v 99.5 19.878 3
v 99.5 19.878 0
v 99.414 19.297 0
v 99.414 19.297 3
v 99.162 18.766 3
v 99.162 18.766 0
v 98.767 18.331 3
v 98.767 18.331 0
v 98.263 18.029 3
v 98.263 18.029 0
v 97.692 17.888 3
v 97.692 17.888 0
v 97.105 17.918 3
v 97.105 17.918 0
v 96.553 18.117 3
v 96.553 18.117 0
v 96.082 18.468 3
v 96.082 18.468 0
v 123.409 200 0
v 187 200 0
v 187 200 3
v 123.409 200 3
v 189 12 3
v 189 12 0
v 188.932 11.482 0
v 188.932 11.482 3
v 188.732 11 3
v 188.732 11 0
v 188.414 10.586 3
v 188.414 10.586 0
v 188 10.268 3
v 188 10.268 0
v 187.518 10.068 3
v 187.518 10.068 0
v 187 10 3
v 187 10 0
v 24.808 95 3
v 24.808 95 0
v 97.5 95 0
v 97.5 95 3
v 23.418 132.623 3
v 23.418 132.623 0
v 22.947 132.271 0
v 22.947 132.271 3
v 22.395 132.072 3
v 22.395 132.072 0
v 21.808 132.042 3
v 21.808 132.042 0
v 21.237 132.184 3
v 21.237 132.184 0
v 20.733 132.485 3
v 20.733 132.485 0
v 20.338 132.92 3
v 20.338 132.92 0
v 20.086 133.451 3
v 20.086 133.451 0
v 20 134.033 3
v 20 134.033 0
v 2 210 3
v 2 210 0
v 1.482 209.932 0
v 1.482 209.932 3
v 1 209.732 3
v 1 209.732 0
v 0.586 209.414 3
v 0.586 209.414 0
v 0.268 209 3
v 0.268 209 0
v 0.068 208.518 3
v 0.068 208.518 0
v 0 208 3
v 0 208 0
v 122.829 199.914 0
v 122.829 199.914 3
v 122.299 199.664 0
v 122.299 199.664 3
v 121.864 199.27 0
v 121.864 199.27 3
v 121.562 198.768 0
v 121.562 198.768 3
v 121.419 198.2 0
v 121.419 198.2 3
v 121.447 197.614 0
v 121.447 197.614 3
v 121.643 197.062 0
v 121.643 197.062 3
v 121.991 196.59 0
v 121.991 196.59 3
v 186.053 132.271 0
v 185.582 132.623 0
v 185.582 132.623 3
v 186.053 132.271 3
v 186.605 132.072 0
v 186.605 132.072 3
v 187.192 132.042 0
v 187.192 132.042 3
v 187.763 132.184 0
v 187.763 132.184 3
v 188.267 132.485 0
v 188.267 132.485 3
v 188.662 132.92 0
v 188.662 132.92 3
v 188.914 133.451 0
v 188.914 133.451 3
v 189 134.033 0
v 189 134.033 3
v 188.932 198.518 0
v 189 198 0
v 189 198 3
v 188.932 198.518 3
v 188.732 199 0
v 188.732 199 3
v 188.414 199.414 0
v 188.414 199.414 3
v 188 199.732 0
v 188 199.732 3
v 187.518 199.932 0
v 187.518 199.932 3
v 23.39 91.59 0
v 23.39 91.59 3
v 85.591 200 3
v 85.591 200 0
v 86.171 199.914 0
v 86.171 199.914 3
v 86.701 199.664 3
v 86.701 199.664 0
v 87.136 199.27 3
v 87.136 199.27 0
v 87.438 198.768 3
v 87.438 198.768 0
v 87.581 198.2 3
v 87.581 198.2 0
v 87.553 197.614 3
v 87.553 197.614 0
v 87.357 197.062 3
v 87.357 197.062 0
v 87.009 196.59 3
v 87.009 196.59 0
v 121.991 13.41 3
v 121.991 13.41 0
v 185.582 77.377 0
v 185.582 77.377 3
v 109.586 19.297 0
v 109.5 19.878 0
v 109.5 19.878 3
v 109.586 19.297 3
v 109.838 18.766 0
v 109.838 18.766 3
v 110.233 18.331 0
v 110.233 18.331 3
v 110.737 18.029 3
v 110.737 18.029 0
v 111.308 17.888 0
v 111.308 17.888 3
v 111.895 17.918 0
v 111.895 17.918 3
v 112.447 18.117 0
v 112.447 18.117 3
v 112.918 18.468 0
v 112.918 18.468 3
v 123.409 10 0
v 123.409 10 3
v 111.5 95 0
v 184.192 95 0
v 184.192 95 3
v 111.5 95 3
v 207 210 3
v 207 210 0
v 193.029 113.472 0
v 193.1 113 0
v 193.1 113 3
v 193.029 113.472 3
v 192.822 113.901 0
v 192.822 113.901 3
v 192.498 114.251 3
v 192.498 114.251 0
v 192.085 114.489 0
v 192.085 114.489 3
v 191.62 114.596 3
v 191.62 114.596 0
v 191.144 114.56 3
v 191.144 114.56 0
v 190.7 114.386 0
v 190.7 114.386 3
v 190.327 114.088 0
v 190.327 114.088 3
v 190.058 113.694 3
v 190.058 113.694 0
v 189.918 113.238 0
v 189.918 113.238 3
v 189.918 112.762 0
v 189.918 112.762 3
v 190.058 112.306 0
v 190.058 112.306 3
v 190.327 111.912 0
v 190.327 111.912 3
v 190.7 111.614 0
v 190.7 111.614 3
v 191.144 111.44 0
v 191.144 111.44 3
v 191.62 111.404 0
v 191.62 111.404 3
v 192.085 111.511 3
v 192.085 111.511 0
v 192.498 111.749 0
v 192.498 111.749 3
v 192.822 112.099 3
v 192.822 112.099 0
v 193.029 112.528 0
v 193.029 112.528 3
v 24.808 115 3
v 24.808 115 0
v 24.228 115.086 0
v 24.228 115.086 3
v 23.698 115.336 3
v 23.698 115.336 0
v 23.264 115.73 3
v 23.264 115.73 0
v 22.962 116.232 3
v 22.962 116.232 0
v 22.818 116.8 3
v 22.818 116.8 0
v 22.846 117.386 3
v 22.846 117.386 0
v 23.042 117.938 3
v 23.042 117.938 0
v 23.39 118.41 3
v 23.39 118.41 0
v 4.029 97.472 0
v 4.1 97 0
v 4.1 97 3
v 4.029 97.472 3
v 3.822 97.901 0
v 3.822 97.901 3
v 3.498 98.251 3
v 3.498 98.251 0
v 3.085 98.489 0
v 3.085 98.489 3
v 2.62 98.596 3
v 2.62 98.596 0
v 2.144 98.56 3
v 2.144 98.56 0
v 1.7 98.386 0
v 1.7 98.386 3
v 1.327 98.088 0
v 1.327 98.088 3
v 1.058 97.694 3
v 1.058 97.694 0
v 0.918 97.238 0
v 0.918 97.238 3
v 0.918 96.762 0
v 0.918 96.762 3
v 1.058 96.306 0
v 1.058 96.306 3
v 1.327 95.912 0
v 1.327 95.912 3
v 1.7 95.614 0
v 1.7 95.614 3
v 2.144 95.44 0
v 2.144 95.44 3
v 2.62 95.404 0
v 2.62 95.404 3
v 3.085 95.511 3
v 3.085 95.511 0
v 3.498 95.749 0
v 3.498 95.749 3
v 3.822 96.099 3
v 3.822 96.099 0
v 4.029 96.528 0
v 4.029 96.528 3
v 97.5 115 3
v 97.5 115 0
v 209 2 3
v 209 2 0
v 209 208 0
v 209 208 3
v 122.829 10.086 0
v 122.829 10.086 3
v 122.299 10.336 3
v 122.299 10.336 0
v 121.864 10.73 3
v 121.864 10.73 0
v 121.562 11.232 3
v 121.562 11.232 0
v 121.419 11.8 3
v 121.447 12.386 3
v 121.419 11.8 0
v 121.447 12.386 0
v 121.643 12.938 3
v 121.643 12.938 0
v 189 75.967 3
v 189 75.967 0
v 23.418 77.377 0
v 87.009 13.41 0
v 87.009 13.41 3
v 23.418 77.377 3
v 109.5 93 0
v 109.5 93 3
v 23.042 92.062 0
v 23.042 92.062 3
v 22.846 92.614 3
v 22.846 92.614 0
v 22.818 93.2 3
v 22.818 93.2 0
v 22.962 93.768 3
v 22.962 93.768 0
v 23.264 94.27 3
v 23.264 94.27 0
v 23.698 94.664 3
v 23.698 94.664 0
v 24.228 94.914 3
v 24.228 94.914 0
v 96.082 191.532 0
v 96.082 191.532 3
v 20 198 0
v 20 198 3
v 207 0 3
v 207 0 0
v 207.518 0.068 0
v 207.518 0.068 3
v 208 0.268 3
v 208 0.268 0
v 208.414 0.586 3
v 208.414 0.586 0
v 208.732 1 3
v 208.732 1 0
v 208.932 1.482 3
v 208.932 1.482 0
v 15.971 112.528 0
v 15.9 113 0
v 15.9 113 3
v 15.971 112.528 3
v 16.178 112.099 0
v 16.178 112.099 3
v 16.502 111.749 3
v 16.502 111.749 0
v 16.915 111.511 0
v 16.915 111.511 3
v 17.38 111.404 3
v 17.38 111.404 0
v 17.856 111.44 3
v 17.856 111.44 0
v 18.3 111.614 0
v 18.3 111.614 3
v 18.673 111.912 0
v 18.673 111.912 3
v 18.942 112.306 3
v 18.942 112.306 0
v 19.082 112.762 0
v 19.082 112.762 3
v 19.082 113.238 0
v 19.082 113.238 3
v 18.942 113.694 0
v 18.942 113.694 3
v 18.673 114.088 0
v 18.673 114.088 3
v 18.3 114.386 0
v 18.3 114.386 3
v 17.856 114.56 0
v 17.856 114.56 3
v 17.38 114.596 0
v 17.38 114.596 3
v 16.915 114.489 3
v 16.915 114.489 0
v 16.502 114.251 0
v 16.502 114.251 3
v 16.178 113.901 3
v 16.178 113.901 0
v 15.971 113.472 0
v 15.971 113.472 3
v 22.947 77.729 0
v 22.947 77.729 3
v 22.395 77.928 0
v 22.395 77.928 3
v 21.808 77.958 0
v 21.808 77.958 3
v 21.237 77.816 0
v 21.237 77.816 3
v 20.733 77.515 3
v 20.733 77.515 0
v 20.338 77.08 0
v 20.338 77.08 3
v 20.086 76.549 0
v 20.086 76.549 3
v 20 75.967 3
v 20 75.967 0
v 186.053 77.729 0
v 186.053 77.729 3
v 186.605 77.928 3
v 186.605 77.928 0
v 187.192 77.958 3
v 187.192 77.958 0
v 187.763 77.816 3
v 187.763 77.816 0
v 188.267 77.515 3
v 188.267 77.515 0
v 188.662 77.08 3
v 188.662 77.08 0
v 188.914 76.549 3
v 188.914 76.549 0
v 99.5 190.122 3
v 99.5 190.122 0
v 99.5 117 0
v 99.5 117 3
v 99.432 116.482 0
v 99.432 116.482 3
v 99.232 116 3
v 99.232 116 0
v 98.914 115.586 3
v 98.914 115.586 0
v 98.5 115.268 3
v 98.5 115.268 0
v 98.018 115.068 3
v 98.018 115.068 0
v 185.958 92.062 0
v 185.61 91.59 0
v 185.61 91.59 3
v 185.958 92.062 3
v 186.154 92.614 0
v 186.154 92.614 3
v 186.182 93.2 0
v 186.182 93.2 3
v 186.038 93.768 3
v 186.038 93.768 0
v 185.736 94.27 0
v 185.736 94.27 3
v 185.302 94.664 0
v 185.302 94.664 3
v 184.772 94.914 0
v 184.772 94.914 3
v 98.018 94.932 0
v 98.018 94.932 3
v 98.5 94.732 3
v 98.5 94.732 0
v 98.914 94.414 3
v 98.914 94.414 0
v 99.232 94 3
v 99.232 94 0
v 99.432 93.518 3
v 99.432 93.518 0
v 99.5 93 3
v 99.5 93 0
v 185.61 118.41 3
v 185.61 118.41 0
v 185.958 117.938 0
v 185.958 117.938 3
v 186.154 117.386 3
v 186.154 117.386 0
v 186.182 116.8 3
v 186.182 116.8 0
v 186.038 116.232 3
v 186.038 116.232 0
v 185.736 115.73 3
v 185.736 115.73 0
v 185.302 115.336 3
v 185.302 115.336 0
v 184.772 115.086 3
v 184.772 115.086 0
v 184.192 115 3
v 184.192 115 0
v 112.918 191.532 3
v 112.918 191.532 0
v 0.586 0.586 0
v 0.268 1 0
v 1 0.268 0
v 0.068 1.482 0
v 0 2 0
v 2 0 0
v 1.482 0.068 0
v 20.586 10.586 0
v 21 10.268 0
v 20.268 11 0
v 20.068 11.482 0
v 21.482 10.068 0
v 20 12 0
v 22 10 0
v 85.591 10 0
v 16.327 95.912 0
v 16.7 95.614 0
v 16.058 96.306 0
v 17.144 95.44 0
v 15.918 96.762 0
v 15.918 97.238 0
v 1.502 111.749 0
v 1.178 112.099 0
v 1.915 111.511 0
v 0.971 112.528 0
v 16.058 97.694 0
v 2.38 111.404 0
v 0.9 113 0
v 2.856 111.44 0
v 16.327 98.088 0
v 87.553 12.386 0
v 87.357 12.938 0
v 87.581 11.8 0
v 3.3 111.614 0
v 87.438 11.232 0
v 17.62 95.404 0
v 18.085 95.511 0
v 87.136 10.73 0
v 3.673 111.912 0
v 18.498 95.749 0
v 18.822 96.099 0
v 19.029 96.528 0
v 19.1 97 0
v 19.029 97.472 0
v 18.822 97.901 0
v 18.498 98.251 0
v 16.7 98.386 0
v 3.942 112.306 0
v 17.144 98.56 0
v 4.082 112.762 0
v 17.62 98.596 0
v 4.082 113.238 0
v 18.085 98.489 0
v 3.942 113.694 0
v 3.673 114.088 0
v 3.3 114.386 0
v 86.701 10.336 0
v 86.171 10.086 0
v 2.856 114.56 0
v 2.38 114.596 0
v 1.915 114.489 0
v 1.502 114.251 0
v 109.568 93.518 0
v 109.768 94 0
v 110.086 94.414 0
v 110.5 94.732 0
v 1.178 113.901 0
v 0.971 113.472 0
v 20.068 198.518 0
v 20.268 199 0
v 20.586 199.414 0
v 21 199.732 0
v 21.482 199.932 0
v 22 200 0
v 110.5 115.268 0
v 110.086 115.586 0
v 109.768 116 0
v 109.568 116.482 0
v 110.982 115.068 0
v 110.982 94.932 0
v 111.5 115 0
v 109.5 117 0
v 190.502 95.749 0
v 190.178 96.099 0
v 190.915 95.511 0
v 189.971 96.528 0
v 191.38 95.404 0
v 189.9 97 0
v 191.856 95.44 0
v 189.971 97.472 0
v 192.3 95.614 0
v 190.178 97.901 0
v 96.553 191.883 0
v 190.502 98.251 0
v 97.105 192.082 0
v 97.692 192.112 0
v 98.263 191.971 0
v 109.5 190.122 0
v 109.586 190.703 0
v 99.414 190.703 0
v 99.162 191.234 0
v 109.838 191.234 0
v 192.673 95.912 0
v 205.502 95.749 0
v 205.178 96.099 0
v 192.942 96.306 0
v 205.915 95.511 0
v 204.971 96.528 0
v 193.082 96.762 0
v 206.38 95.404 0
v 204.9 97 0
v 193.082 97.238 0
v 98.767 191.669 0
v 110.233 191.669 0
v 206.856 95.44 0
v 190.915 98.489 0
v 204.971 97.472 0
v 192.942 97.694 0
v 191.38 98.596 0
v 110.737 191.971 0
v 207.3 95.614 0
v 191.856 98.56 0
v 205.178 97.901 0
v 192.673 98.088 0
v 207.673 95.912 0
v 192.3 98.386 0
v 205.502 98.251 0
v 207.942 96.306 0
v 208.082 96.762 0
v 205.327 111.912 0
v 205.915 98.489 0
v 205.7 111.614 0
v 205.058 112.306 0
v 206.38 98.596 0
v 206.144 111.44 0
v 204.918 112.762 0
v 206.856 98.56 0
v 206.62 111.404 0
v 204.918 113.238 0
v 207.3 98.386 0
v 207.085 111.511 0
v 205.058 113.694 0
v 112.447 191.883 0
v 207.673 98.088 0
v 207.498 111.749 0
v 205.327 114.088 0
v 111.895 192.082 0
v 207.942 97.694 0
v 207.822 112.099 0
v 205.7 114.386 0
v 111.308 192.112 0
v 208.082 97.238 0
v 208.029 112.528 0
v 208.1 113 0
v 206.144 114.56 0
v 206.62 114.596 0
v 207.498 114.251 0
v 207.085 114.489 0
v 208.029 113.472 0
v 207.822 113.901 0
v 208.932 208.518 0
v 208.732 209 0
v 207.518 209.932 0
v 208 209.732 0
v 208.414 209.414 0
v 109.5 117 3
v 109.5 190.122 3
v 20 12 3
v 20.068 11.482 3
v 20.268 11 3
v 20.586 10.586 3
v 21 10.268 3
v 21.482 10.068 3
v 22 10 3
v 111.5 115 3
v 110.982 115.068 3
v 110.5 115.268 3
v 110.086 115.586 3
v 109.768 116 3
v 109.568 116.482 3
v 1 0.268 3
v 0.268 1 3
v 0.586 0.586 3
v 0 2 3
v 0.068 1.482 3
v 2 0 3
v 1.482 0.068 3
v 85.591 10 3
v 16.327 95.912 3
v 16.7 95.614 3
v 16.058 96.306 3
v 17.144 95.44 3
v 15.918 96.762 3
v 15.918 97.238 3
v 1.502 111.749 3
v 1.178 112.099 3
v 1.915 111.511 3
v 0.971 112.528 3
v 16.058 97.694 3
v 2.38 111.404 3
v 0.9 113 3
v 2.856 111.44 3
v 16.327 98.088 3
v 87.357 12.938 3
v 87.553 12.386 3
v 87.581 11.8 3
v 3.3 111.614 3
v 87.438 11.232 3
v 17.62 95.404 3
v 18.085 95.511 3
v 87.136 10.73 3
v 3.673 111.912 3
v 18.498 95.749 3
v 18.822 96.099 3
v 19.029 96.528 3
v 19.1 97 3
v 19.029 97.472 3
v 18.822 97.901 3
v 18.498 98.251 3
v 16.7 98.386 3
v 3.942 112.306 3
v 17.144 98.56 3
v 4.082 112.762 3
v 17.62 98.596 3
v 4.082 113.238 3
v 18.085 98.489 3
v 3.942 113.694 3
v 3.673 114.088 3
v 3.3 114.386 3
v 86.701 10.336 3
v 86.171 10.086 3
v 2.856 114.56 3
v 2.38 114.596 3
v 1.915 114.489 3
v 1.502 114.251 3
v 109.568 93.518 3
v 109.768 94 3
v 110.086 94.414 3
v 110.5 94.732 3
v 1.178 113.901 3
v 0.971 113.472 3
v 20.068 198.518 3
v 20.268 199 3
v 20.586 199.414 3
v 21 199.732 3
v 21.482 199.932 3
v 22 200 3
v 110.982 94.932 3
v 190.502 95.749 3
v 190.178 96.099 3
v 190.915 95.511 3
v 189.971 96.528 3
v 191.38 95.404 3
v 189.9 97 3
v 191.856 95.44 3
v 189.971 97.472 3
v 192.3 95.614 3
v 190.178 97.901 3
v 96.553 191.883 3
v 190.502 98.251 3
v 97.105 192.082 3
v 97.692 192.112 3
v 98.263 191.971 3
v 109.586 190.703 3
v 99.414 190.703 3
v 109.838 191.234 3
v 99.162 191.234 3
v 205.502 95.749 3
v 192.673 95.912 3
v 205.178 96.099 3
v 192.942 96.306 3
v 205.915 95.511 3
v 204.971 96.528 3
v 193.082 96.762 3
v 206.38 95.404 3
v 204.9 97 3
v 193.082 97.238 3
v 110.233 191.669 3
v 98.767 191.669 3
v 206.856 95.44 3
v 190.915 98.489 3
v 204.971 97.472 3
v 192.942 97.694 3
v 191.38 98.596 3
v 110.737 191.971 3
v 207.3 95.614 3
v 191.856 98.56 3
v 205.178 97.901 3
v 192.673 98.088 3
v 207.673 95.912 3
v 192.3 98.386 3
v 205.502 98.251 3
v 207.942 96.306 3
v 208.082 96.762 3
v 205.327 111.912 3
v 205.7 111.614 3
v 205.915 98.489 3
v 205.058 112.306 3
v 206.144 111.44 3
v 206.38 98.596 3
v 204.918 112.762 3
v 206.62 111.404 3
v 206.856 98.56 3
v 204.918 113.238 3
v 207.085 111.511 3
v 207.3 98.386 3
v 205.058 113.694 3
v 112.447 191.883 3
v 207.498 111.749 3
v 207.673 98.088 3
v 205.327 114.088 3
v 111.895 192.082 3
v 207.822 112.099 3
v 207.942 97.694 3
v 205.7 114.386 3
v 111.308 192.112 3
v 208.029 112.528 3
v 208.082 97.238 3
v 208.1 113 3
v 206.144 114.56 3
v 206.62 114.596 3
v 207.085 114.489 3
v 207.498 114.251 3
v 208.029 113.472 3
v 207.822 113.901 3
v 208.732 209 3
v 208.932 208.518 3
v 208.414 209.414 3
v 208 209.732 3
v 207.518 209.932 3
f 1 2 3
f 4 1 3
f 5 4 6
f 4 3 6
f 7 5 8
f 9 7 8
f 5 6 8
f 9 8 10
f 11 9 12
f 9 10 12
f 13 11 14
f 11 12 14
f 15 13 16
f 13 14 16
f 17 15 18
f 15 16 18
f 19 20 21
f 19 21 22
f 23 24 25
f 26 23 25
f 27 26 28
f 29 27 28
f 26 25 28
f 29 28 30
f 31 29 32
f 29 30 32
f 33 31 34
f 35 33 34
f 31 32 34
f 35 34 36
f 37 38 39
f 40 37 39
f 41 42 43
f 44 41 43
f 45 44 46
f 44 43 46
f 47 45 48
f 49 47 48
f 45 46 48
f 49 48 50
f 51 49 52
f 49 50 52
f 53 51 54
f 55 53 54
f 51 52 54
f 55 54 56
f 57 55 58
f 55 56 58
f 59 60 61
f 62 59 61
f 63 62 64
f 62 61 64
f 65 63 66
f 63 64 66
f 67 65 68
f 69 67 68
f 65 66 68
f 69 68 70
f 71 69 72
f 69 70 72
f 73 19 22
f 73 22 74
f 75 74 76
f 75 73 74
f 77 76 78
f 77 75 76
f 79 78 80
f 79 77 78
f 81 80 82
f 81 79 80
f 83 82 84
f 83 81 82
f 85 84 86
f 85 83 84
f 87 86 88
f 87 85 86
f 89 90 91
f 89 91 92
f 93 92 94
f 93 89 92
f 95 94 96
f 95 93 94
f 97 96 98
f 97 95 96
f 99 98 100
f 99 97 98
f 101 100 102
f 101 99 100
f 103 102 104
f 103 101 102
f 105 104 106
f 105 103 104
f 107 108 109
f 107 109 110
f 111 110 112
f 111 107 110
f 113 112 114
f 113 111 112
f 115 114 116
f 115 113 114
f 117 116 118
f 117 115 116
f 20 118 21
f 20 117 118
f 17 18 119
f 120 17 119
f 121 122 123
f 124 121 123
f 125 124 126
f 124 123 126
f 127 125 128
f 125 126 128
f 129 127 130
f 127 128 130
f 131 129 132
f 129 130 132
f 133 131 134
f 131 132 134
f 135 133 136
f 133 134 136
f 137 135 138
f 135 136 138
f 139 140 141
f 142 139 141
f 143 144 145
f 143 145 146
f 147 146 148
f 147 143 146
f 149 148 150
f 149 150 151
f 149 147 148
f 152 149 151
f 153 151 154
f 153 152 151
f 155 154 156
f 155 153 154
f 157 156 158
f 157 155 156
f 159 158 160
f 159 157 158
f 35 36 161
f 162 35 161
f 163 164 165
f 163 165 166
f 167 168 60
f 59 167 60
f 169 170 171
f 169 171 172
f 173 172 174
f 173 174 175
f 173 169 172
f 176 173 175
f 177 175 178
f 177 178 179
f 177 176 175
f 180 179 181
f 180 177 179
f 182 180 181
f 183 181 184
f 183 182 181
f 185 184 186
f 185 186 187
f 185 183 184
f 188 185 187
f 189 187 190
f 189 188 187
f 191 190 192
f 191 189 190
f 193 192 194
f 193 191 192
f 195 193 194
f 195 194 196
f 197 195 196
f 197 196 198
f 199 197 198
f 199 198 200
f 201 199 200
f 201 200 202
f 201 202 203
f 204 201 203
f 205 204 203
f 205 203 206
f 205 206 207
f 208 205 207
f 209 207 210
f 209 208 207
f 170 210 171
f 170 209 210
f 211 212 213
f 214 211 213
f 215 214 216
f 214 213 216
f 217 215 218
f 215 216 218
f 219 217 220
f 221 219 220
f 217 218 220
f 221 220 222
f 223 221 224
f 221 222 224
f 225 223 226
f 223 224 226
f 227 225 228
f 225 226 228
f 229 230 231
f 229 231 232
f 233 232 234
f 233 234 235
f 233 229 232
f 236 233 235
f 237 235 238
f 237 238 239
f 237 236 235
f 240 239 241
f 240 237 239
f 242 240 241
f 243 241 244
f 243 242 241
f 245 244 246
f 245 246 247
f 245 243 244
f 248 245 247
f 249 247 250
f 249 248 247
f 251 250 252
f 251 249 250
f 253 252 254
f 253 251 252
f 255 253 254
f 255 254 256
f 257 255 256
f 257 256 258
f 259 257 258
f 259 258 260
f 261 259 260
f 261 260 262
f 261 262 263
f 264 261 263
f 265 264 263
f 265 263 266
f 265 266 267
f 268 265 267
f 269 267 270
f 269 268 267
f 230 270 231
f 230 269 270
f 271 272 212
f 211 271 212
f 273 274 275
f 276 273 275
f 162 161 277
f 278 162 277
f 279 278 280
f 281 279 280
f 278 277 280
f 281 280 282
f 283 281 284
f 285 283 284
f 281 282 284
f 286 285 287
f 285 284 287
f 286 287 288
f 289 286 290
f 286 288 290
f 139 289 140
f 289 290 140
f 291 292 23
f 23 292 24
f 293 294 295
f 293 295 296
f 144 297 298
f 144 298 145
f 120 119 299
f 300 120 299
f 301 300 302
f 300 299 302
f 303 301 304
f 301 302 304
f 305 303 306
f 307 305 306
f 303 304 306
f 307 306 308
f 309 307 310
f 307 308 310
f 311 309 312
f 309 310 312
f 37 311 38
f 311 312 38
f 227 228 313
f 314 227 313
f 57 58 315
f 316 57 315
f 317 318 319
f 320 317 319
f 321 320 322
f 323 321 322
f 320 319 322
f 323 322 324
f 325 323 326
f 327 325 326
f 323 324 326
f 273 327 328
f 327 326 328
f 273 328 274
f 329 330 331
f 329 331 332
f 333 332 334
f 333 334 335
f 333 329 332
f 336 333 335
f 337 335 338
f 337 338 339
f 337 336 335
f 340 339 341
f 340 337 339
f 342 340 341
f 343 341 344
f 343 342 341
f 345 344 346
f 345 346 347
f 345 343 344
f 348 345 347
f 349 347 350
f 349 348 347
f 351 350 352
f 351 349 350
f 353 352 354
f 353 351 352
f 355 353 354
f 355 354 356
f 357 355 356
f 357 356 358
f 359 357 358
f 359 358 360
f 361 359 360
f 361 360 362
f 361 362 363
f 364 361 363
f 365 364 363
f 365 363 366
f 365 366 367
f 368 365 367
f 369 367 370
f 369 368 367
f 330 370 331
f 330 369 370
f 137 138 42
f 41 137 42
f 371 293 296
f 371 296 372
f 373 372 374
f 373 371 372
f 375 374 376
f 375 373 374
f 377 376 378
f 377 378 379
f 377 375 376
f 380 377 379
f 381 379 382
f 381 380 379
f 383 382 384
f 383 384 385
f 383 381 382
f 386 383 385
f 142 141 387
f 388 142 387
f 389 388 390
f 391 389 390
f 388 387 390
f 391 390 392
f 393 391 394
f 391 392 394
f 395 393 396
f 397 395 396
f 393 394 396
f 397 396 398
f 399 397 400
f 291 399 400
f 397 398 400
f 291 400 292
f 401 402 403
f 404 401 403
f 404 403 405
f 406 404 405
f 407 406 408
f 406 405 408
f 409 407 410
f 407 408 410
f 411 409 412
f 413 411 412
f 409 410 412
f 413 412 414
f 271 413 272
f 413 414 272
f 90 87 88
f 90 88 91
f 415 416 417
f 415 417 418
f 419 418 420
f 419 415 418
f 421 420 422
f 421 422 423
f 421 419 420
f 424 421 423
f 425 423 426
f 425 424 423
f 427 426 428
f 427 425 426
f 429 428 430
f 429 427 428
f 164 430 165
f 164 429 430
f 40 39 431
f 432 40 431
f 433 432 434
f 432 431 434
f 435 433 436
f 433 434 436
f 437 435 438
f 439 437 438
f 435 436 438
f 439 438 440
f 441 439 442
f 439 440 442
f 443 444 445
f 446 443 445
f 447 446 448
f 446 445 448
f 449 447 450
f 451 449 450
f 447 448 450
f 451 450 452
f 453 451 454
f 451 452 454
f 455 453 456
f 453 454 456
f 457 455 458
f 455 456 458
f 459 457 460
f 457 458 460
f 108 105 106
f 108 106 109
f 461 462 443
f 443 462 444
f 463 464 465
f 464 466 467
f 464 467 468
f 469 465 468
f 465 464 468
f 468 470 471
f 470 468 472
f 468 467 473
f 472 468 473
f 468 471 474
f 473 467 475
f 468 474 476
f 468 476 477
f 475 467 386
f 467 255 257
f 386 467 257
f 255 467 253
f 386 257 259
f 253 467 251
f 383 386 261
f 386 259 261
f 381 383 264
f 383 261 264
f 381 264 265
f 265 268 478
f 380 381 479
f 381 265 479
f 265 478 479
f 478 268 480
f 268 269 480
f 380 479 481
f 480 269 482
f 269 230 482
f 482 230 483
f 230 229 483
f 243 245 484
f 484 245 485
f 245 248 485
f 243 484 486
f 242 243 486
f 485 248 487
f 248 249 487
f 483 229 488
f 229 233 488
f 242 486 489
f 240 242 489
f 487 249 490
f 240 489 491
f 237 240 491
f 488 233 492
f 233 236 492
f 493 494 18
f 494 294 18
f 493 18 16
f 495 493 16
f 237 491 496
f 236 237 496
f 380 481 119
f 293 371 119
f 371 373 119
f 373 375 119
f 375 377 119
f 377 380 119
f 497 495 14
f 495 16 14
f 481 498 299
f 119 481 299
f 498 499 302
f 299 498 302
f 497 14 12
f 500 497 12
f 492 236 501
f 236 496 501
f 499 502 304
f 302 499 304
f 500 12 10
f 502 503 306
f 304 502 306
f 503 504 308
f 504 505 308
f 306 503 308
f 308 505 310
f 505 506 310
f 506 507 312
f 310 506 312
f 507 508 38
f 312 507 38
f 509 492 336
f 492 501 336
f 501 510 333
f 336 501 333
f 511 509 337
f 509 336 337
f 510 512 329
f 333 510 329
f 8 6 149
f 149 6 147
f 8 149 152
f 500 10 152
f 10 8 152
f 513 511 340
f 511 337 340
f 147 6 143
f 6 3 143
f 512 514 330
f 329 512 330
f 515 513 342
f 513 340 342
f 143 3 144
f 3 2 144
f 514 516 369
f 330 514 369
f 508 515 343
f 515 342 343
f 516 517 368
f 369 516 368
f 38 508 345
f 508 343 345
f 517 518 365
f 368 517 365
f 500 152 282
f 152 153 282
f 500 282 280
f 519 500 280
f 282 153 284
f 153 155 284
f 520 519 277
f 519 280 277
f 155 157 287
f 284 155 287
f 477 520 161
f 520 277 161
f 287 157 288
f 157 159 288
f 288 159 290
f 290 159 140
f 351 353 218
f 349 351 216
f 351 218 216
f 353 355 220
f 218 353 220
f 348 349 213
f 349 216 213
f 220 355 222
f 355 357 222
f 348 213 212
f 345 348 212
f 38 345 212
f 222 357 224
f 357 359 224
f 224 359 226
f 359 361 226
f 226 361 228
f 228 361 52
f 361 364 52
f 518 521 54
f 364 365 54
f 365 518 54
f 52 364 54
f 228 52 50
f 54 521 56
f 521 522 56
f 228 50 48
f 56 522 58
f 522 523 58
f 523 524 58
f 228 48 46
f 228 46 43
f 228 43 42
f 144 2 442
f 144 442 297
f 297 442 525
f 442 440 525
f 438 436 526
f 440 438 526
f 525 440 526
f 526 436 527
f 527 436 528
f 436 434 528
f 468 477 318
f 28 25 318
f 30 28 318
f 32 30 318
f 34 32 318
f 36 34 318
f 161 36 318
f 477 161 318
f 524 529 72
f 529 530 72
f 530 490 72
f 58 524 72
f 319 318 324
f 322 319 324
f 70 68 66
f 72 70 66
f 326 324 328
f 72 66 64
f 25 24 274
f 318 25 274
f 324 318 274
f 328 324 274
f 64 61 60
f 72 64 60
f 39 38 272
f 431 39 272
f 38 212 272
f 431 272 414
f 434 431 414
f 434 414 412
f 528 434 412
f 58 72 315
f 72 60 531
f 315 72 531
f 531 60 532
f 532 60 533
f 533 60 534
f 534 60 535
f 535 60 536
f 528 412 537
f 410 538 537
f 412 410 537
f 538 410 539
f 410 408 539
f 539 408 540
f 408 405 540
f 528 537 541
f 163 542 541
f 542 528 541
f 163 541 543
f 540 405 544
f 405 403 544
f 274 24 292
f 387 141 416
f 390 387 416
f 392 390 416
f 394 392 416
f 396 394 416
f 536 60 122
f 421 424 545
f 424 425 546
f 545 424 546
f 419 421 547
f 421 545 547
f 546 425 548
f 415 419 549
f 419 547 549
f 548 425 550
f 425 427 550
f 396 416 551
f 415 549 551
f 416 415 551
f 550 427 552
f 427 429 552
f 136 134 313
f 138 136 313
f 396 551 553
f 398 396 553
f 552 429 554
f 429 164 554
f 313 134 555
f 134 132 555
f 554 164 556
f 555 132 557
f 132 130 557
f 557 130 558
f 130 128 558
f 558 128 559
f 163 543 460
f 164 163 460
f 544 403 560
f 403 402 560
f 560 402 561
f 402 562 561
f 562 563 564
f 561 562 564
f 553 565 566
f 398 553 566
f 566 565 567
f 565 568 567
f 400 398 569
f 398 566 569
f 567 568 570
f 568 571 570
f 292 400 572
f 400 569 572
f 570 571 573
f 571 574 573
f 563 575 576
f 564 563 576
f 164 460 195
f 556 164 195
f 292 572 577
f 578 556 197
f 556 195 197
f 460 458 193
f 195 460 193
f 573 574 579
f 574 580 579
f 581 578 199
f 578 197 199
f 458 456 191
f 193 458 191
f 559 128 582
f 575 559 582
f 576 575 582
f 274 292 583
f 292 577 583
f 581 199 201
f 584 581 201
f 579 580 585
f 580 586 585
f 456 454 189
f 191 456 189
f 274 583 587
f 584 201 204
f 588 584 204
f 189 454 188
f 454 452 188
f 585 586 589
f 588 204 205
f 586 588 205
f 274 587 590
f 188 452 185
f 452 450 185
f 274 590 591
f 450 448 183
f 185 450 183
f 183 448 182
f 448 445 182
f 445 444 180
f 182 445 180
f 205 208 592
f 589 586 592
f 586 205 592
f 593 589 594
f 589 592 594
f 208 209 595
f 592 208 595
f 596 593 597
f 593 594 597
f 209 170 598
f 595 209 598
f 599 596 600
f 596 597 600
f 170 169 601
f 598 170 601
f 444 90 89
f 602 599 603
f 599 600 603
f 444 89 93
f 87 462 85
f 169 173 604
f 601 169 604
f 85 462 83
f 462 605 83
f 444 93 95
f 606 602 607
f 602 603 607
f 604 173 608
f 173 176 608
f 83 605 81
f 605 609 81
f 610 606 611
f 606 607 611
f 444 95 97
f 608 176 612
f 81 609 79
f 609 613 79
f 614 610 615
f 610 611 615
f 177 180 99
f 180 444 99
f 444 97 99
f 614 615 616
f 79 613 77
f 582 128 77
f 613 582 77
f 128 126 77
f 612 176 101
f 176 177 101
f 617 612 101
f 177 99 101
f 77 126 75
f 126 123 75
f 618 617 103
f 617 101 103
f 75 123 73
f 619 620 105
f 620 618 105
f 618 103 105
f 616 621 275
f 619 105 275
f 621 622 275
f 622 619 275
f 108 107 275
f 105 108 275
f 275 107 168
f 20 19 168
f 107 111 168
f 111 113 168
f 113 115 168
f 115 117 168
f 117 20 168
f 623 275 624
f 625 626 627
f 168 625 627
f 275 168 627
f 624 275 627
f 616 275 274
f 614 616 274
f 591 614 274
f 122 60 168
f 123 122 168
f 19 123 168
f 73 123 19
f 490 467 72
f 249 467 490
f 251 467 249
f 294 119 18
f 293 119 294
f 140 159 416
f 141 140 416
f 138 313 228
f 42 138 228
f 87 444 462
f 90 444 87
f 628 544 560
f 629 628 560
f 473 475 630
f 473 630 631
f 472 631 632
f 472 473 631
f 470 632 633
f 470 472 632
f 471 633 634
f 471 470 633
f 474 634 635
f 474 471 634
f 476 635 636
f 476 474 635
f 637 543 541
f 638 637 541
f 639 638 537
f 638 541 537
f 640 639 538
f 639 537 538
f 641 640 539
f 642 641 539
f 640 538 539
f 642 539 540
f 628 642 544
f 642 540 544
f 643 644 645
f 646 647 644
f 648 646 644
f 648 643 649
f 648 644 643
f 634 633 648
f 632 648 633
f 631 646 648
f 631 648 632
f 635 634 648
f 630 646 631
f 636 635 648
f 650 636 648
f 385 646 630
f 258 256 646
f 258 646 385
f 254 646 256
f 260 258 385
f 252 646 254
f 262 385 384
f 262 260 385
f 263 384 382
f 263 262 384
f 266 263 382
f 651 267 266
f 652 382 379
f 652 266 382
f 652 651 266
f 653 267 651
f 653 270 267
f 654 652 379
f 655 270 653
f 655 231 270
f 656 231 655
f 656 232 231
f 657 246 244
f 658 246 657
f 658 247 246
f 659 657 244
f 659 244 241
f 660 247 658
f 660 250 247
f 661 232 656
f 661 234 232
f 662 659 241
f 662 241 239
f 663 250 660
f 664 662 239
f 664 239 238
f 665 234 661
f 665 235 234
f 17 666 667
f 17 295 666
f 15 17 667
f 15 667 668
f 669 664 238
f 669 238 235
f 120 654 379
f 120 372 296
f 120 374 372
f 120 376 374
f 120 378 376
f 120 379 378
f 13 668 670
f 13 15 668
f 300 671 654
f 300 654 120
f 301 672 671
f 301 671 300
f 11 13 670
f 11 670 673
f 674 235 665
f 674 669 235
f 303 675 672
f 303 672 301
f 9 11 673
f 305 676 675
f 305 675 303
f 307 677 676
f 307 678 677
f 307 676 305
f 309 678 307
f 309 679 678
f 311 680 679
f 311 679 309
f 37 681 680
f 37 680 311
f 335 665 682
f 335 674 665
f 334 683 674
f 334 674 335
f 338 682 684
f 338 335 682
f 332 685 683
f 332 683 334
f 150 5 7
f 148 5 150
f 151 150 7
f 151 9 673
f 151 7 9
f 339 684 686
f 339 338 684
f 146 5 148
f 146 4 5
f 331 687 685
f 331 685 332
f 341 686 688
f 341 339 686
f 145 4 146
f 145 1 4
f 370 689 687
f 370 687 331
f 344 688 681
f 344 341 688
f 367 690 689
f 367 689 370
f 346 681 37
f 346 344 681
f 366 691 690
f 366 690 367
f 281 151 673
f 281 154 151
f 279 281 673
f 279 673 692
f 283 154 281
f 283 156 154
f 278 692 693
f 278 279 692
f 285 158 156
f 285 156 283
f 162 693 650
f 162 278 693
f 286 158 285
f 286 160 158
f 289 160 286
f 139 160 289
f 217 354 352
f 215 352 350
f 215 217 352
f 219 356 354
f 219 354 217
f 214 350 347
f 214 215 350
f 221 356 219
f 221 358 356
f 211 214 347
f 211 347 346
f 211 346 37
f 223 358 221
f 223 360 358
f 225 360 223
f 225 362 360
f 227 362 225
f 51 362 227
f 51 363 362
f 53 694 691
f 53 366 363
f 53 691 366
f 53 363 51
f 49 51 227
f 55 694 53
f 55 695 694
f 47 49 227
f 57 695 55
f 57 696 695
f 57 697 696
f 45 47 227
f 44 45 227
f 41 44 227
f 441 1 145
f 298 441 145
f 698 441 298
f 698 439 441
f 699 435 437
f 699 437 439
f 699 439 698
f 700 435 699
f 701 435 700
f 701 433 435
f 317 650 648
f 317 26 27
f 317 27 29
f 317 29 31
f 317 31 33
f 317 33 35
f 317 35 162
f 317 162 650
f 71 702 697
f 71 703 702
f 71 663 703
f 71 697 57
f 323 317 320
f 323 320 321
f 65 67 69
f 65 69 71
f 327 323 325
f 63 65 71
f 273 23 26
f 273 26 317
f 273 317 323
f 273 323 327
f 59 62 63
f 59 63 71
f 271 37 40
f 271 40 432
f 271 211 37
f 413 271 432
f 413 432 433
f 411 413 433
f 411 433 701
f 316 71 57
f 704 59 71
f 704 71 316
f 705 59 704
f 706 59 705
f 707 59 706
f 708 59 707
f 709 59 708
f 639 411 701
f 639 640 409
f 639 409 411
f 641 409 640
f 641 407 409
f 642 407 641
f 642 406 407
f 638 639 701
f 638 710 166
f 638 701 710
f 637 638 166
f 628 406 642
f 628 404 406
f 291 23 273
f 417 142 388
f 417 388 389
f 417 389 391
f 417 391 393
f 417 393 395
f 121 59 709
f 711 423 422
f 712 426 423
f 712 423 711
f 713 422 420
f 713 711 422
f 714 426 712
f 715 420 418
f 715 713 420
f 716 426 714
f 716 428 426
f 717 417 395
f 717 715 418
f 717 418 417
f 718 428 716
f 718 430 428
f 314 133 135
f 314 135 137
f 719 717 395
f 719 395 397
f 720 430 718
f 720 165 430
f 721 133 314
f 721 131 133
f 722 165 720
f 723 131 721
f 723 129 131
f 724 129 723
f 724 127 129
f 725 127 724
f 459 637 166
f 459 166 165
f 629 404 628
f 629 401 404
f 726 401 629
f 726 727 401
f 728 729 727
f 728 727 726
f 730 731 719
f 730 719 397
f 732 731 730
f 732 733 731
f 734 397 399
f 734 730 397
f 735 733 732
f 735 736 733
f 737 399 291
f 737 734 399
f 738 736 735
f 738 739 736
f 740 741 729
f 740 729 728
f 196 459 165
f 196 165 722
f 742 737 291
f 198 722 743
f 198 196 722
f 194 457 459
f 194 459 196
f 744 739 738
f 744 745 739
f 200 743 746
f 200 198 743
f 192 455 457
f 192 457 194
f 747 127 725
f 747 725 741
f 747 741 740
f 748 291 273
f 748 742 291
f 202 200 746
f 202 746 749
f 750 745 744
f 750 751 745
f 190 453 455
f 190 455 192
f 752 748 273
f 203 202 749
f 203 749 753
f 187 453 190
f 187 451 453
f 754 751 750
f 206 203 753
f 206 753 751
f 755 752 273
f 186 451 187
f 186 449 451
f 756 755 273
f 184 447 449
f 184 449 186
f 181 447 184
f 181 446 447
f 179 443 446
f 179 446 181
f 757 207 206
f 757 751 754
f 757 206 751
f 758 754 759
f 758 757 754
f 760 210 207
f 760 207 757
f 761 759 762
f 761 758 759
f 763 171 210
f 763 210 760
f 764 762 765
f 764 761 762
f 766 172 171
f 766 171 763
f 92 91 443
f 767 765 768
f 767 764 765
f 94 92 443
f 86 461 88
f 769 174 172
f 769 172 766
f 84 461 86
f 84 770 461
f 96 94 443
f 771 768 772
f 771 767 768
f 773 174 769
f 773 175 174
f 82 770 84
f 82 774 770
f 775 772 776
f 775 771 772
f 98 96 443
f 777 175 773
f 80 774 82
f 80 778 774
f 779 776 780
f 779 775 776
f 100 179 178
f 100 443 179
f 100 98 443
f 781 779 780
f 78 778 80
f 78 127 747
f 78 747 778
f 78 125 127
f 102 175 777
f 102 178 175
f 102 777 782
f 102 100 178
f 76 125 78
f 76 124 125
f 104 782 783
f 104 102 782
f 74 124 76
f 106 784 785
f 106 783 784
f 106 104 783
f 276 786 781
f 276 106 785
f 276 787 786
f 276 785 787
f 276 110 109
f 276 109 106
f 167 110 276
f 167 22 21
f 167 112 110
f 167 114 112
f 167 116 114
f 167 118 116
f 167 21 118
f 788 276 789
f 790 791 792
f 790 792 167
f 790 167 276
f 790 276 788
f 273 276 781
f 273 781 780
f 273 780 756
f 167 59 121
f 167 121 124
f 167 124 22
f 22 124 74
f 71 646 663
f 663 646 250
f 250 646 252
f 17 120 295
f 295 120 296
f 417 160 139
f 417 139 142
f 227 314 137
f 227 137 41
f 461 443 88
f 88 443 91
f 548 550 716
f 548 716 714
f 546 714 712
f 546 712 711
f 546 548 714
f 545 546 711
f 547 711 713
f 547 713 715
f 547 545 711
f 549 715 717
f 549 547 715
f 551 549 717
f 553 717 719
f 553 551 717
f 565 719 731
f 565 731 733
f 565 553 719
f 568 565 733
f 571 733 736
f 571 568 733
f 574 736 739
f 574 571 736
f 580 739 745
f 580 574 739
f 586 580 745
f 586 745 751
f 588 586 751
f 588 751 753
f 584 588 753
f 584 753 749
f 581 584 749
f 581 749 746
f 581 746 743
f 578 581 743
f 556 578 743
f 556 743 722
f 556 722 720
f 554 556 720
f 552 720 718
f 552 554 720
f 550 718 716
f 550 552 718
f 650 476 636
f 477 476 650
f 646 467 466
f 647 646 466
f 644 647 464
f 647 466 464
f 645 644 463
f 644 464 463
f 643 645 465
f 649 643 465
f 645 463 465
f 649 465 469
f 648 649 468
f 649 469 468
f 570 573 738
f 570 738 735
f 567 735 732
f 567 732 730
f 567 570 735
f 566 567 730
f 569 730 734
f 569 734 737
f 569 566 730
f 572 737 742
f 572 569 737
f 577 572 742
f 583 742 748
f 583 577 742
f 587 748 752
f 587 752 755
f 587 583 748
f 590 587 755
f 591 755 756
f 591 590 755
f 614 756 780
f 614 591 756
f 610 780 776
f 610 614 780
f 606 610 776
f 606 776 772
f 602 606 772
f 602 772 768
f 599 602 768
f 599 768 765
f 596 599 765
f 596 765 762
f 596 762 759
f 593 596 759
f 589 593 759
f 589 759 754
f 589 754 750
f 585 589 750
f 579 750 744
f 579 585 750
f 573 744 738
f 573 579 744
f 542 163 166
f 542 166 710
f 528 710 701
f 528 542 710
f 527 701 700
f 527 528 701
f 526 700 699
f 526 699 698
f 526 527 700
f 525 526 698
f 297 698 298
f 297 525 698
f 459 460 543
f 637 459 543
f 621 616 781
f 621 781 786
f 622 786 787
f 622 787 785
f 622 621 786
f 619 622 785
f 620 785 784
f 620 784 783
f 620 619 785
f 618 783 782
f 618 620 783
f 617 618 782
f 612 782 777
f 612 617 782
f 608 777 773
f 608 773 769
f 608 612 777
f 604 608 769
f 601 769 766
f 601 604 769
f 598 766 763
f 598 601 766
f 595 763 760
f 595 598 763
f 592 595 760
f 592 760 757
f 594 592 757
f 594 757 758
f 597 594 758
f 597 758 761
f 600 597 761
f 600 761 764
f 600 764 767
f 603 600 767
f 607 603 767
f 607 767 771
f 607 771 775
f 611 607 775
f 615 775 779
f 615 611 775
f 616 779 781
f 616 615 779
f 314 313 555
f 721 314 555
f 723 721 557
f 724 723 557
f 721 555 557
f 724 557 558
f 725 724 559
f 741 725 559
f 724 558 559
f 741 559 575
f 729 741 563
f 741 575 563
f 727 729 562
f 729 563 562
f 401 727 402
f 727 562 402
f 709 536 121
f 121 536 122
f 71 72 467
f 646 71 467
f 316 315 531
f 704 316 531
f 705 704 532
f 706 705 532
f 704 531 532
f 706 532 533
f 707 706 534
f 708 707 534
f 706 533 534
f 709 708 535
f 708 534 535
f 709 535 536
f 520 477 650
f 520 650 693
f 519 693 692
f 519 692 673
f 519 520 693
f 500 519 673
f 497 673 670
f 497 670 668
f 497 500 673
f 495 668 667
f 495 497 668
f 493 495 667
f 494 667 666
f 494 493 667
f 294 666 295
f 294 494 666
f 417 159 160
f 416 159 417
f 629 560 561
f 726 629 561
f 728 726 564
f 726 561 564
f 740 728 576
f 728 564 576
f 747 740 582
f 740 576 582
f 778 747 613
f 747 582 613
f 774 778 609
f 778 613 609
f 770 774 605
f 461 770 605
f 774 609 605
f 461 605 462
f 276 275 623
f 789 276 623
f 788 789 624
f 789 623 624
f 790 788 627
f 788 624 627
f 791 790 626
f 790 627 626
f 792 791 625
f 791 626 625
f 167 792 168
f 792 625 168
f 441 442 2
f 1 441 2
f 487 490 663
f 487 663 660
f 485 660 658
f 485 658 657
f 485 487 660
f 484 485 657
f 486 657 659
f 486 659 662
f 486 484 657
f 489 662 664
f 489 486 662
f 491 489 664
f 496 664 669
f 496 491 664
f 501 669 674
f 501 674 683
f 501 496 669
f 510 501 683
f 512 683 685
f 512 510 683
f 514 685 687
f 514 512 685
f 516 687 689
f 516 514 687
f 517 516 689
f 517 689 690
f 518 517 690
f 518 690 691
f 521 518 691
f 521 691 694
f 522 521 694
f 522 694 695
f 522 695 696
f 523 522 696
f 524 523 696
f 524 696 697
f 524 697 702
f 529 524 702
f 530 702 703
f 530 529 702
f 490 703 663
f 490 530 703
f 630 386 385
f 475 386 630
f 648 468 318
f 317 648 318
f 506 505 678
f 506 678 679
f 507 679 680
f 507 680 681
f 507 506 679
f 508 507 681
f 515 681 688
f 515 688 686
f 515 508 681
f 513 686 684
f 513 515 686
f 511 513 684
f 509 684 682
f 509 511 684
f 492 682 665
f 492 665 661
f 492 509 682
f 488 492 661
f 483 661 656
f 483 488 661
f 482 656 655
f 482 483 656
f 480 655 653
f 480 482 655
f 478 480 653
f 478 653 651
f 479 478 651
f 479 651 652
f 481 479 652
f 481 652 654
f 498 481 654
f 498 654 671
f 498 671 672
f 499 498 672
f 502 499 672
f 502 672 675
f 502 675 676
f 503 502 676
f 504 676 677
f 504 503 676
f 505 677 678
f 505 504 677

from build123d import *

# Parameters (mm, degrees)
SKETCH_1_R      = 1.6
EXTRUDE_1_DEPTH = 3


with BuildPart() as part:
    # 草图1 → 凸台-拉伸1 (new body)
    with BuildSketch(Plane.XY):
        with BuildLine():
            Line((2, 0), (207, 0))
            ThreePointArc((207, 0), (208.414213562, 0.585786438), (209, 2))
            Line((209, 2), (209, 208))
            ThreePointArc((209, 208), (208.414213562, 209.414213562), (207, 210))
            Line((207, 210), (2, 210))
            ThreePointArc((2, 210), (0.585786438, 209.414213562), (0, 208))
            Line((0, 208), (0, 2))
            ThreePointArc((0, 2), (0.585786438, 0.585786438), (2, 0))
        make_face()
        with Locations((2.5, 97)):
            Circle(SKETCH_1_R, mode=Mode.SUBTRACT)
        with Locations((17.5, 97)):
            Circle(SKETCH_1_R, mode=Mode.SUBTRACT)
        with Locations(Location((17.5, 113, 0), (0, 0, 180))):
            Circle(SKETCH_1_R, mode=Mode.SUBTRACT)
        with Locations(Location((2.5, 113, 0), (0, 0, 180))):
            Circle(SKETCH_1_R, mode=Mode.SUBTRACT)
        with Locations(Location((206.5, 97, 0), (0, 0, 180))):
            Circle(SKETCH_1_R, mode=Mode.SUBTRACT)
        with Locations(Location((191.5, 97, 0), (0, 0, 180))):
            Circle(SKETCH_1_R, mode=Mode.SUBTRACT)
        with Locations((191.5, 113)):
            Circle(SKETCH_1_R, mode=Mode.SUBTRACT)
        with Locations((206.5, 113)):
            Circle(SKETCH_1_R, mode=Mode.SUBTRACT)
        with BuildLine():
            Line((24.808355785, 95), (97.5, 95))
            ThreePointArc((97.5, 95), (98.914213562, 94.414213562), (99.5, 93))
            Line((99.5, 93), (99.5, 19.878227713))
            ThreePointArc((99.5, 19.878227713), (98.262640733, 18.029341802), (96.081620887, 18.468192007))
            Line((96.081620887, 18.468192007), (23.389976673, 91.589964294))
            ThreePointArc((23.389976673, 91.589964294), (22.961727586, 93.768091332), (24.808355785, 95))
        make_face(mode=Mode.SUBTRACT)
        with BuildLine():
            Line((112.918379113, 18.468192007), (185.610023327, 91.589964294))
            ThreePointArc((185.610023327, 91.589964294), (186.038272414, 93.768091332), (184.191644215, 95))
            Line((184.191644215, 95), (111.5, 95))
            ThreePointArc((111.5, 95), (110.085786438, 94.414213562), (109.5, 93))
            Line((109.5, 93), (109.5, 19.878227713))
            ThreePointArc((109.5, 19.878227713), (110.737359267, 18.029341802), (112.918379113, 18.468192007))
        make_face(mode=Mode.SUBTRACT)
        with BuildLine():
            Line((20, 75.967320112), (20, 12))
            ThreePointArc((20, 12), (20.585786438, 10.585786438), (22, 10))
            Line((22, 10), (85.591041759, 10))
            ThreePointArc((85.591041759, 10), (87.437669958, 11.231908668), (87.009420872, 13.410035706))
            Line((87.009420872, 13.410035706), (23.418379113, 77.377355819))
            ThreePointArc((23.418379113, 77.377355819), (21.237359267, 77.816206024), (20, 75.967320112))
        make_face(mode=Mode.SUBTRACT)
        with BuildLine():
            Line((121.990579128, 13.410035706), (185.581620887, 77.377355819))
            ThreePointArc((185.581620887, 77.377355819), (187.762640733, 77.816206024), (189, 75.967320112))
            Line((189, 75.967320112), (189, 12))
            ThreePointArc((189, 12), (188.414213562, 10.585786438), (187, 10))
            Line((187, 10), (123.408958241, 10))
            ThreePointArc((123.408958241, 10), (121.562330042, 11.231908668), (121.990579128, 13.410035706))
        make_face(mode=Mode.SUBTRACT)
        with BuildLine():
            Line((187, 200), (123.408958241, 200))
            ThreePointArc((123.408958241, 200), (121.562330042, 198.768091332), (121.990579128, 196.589964294))
            Line((121.990579128, 196.589964294), (185.581620887, 132.622644181))
            ThreePointArc((185.581620887, 132.622644181), (187.762640733, 132.183793976), (189, 134.032679888))
            Line((189, 134.032679888), (189, 198))
            ThreePointArc((189, 198), (188.414213562, 199.414213562), (187, 200))
        make_face(mode=Mode.SUBTRACT)
        with BuildLine():
            Line((87.009420872, 196.589964294), (23.418379113, 132.622644181))
            ThreePointArc((23.418379113, 132.622644181), (21.237359267, 132.183793976), (20, 134.032679888))
            Line((20, 134.032679888), (20, 198))
            ThreePointArc((20, 198), (20.585786438, 199.414213562), (22, 200))
            Line((22, 200), (85.591041759, 200))
            ThreePointArc((85.591041759, 200), (87.437669958, 198.768091332), (87.009420872, 196.589964294))
        make_face(mode=Mode.SUBTRACT)
        with BuildLine():
            Line((184.191644215, 115), (111.5, 115))
            ThreePointArc((111.5, 115), (110.085786438, 115.585786438), (109.5, 117))
            Line((109.5, 117), (109.5, 190.121772287))
            ThreePointArc((109.5, 190.121772287), (110.737359267, 191.970658198), (112.918379113, 191.531807993))
            Line((112.918379113, 191.531807993), (185.610023327, 118.410035706))
            ThreePointArc((185.610023327, 118.410035706), (186.038272414, 116.231908668), (184.191644215, 115))
        make_face(mode=Mode.SUBTRACT)
        with BuildLine():
            Line((23.389976673, 118.410035706), (96.081620887, 191.531807993))
            ThreePointArc((96.081620887, 191.531807993), (98.262640733, 191.970658198), (99.5, 190.121772287))
            Line((99.5, 190.121772287), (99.5, 117))
            ThreePointArc((99.5, 117), (98.914213562, 115.585786438), (97.5, 115))
            Line((97.5, 115), (24.808355785, 115))
            ThreePointArc((24.808355785, 115), (22.961727586, 116.231908668), (23.389976673, 118.410035706))
        make_face(mode=Mode.SUBTRACT)
    extrude(amount=EXTRUDE_1_DEPTH)


solid = part.part
